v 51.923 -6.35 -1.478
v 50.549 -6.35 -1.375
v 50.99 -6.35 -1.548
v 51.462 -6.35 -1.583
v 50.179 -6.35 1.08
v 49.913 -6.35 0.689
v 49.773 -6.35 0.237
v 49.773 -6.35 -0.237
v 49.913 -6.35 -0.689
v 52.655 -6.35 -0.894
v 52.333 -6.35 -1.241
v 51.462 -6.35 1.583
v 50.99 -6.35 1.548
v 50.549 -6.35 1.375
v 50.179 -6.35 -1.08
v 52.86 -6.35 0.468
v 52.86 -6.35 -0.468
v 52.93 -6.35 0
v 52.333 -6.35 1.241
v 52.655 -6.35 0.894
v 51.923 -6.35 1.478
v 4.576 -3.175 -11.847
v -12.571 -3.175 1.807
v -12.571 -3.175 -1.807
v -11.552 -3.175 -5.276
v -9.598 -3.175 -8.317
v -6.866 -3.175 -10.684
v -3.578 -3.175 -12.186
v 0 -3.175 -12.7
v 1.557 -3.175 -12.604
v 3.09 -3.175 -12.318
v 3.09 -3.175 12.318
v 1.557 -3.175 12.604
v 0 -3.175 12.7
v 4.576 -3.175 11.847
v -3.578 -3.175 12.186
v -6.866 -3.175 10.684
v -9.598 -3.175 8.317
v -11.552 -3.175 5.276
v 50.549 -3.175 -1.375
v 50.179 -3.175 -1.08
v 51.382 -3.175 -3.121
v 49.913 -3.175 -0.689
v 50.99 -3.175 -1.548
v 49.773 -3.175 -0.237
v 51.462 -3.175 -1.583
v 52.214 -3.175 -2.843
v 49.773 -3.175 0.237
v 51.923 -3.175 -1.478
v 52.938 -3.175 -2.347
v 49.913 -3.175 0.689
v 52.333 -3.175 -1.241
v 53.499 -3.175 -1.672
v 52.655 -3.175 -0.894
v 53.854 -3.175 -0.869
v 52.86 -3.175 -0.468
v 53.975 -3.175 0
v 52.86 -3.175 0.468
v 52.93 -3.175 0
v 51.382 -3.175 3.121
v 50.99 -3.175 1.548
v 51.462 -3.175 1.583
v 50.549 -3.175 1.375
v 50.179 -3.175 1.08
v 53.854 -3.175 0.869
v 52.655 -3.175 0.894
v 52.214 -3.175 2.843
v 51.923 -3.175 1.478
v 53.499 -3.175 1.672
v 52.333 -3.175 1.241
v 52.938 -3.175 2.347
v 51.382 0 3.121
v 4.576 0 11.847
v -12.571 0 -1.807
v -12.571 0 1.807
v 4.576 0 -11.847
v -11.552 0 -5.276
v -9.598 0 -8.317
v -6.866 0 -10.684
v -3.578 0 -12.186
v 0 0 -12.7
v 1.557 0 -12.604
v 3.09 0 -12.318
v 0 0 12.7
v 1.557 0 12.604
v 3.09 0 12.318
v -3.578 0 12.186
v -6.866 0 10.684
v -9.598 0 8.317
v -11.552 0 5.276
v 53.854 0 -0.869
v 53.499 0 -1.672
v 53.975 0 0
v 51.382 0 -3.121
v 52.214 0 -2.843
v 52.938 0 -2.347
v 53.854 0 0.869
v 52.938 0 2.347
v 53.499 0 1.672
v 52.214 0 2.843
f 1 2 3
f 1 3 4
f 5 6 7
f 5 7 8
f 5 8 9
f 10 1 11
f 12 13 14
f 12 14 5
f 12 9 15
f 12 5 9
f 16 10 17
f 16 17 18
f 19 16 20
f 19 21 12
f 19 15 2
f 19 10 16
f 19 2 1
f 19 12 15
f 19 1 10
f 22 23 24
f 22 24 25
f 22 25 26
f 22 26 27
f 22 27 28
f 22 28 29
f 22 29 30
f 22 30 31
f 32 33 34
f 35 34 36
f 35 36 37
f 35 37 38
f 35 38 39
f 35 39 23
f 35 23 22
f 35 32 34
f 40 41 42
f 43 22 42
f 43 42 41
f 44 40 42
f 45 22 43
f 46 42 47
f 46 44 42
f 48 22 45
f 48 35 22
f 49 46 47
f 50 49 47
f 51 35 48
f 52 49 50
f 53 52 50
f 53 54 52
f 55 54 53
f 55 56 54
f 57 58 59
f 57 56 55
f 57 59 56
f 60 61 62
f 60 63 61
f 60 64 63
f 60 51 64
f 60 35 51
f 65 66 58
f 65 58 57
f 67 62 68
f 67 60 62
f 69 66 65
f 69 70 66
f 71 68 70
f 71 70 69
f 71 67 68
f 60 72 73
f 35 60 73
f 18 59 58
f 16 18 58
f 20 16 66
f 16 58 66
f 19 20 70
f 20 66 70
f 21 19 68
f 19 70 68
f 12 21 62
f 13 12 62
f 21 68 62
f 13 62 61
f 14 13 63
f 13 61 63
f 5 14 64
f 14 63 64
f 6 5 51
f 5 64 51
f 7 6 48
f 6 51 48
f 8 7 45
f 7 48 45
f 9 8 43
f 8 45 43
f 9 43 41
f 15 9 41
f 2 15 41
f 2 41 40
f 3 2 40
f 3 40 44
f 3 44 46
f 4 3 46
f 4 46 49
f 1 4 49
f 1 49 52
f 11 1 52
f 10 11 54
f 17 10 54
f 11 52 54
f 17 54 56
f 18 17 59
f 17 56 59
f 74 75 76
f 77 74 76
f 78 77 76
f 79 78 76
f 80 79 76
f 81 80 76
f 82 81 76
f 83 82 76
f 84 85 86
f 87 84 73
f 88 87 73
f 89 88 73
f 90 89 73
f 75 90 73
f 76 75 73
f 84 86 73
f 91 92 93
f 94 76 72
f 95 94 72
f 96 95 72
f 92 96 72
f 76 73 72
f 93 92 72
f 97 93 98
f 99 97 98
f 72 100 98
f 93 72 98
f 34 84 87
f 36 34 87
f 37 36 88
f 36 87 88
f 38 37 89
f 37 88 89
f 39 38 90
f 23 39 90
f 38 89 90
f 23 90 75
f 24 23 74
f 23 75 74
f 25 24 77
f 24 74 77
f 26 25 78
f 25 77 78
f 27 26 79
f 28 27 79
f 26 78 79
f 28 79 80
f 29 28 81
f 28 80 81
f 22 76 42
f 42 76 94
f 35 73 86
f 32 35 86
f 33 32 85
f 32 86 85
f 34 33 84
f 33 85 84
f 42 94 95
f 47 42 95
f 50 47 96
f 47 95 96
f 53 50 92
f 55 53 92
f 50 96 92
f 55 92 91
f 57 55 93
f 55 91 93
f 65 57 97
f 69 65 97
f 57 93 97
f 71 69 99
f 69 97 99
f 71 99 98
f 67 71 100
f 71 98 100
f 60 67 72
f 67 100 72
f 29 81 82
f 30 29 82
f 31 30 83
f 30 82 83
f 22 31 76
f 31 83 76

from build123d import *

# Parameters (mm, degrees)
F1_DEPTH = 3.175
F2_R     = 1.5875
F3_DEPTH = 3.175


with BuildPart() as f1:
    # F0 (on Front) → F1 (new body)
    with BuildSketch(Plane.XZ):
        with BuildLine():
            Line((0, 12.7), (4.576113, 11.846906))
            ThreePointArc((4.576113, 11.846906), (2.327476, 12.484905), (0, 12.7))
        make_face()
        with BuildLine():
            Line((51.381869, 3.121226), (4.576113, 11.846906))
            Line((4.576113, 11.846906), (0, 12.7))
            ThreePointArc((0, 12.7), (-12.7, 0), (0, -12.7))
            Line((0, -12.7), (4.576113, -11.846906))
            Line((4.576113, -11.846906), (51.381869, -3.121226))
            ThreePointArc((51.381869, -3.121226), (53.975, 0), (51.381869, 3.121226))
        make_face()
        with BuildLine():
            Line((4.576113, -11.846906), (0, -12.7))
            ThreePointArc((0, -12.7), (2.327476, -12.484905), (4.576113, -11.846906))
        make_face()
    extrude(amount=F1_DEPTH)

    # F2 (on face) → F3 (join)
    with BuildSketch(Plane.XZ.offset(3.175)):
        with Locations((51.342945, 0)):
            Circle(F2_R)
    extrude(amount=F3_DEPTH)


solid = f1.part
